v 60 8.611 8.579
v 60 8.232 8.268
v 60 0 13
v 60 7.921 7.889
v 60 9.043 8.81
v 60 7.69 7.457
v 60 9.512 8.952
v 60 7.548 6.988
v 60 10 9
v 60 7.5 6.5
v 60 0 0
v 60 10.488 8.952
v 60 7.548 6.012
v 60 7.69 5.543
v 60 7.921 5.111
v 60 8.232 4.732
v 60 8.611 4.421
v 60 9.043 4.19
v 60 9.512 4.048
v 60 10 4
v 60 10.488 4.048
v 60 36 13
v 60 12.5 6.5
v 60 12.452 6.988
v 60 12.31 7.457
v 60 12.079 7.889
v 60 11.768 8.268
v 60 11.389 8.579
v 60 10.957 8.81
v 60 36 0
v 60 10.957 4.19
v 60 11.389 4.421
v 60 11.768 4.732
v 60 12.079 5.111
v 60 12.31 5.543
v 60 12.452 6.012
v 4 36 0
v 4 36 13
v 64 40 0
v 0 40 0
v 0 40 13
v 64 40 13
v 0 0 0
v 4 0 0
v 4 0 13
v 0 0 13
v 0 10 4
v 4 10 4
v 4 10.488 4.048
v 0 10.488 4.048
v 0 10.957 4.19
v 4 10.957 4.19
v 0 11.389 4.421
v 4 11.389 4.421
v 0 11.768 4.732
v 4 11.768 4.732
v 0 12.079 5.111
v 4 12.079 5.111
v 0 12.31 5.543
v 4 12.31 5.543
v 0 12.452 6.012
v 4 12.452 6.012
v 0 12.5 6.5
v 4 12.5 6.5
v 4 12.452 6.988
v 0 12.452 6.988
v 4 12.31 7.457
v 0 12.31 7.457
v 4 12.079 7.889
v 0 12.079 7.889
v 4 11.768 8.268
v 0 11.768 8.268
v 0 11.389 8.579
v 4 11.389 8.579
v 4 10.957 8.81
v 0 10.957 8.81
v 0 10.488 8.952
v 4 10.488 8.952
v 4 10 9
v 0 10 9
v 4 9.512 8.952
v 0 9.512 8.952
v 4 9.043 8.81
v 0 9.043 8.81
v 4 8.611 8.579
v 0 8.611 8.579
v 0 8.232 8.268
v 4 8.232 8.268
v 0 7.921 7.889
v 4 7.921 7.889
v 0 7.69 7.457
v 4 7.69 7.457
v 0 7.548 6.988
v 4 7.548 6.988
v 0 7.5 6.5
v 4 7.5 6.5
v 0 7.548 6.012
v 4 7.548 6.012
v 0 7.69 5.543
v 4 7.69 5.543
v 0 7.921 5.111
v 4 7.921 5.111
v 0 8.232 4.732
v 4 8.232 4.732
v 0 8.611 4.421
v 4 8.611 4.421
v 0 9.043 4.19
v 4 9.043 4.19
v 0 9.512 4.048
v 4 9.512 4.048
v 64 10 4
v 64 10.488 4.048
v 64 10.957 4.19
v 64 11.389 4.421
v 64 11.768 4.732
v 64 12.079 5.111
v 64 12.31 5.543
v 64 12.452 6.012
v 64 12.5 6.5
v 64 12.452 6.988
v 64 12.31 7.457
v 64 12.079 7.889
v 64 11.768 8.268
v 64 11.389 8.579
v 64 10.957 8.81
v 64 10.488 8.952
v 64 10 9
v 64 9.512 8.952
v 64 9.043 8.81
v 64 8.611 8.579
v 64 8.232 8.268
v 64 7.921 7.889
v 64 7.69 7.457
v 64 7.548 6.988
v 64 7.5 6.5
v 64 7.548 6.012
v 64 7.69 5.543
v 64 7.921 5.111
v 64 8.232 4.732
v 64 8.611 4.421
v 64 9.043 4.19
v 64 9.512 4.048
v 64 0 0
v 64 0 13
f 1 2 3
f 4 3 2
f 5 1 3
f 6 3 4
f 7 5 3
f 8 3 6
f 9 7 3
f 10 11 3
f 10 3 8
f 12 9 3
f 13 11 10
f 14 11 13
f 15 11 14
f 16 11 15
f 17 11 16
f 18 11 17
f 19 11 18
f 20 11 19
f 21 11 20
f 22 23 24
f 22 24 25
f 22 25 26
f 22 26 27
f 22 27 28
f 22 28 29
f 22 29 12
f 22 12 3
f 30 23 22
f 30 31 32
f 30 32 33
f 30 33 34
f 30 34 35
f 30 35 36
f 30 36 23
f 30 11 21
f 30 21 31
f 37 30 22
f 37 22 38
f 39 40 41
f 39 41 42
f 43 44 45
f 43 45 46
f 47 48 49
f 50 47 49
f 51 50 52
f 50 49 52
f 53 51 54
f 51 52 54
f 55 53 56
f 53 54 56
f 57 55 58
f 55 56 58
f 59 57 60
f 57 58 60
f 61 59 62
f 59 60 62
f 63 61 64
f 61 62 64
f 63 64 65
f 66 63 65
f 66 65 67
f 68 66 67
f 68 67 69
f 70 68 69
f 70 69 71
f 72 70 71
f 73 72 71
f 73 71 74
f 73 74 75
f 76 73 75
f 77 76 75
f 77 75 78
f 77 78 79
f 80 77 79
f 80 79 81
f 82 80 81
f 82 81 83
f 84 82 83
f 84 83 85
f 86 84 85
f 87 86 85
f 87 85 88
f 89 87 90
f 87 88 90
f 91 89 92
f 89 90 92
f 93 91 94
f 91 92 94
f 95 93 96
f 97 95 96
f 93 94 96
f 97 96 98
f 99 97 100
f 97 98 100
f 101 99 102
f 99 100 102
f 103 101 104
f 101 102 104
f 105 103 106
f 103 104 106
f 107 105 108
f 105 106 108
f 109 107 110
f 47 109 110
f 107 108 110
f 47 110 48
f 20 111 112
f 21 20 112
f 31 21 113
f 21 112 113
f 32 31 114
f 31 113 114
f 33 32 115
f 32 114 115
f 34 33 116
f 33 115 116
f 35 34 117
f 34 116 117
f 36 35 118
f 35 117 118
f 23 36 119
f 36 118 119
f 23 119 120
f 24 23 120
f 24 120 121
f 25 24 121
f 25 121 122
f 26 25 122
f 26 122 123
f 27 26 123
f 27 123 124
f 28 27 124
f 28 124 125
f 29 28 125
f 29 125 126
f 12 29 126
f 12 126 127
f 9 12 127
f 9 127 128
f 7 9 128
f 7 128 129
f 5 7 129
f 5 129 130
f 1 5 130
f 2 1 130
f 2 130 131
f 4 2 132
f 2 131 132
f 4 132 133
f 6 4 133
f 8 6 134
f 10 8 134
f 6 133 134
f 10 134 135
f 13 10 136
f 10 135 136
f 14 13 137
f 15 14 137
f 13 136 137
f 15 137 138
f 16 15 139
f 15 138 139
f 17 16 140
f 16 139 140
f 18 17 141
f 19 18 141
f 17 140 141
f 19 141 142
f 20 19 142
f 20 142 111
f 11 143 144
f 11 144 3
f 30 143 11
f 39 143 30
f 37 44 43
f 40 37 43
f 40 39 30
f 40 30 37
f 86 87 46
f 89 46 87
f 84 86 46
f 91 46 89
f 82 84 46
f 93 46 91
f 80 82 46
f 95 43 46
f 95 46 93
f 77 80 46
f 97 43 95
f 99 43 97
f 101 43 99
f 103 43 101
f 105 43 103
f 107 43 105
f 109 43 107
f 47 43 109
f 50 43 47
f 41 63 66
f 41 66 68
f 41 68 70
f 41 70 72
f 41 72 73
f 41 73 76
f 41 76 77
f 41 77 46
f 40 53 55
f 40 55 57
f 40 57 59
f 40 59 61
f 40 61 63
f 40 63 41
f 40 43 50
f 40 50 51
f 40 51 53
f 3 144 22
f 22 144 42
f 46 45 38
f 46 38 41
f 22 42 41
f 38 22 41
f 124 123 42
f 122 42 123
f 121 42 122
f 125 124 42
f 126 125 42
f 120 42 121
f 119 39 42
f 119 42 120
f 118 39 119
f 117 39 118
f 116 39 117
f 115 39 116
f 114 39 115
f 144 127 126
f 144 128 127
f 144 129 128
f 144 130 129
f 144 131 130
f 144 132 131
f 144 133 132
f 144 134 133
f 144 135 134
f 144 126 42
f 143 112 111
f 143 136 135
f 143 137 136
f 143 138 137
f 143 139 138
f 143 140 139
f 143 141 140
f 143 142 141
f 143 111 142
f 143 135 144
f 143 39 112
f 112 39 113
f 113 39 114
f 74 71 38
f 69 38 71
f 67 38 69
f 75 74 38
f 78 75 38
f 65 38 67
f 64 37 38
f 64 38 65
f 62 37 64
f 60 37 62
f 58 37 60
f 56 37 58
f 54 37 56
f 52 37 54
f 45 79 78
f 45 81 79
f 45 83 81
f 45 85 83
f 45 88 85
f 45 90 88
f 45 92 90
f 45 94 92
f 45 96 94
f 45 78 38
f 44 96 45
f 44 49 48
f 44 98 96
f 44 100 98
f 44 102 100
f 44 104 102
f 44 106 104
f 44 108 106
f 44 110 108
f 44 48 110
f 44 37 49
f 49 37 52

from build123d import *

# Parameters (mm, degrees)
BOSS_EXTRU_1_DEPTH      = 13
ESQUISSE2_R             = 2.5
ENL_V_MAT_EXTRU_1_DEPTH = 77.583287994


with BuildPart() as part:
    # Esquisse1 → Boss.-Extru.1 (new body)
    with BuildSketch(Plane.XY):
        Polygon((0, 0), (0, 40), (64, 40), (64, 0), (60, 0), (60, 36), (4, 36), (4, 0), align=None)
    extrude(amount=BOSS_EXTRU_1_DEPTH)

    # Esquisse2 → Enlèv. mat.-Extru.1 (cut, through all)
    with BuildSketch(Plane(origin=(64, 0, 0), x_dir=(0, 0, -1), z_dir=(1, 0, 0))):
        with Locations((-6.5, 10)):
            Circle(ESQUISSE2_R)
    extrude(amount=-ENL_V_MAT_EXTRU_1_DEPTH, mode=Mode.SUBTRACT)


solid = part.part
